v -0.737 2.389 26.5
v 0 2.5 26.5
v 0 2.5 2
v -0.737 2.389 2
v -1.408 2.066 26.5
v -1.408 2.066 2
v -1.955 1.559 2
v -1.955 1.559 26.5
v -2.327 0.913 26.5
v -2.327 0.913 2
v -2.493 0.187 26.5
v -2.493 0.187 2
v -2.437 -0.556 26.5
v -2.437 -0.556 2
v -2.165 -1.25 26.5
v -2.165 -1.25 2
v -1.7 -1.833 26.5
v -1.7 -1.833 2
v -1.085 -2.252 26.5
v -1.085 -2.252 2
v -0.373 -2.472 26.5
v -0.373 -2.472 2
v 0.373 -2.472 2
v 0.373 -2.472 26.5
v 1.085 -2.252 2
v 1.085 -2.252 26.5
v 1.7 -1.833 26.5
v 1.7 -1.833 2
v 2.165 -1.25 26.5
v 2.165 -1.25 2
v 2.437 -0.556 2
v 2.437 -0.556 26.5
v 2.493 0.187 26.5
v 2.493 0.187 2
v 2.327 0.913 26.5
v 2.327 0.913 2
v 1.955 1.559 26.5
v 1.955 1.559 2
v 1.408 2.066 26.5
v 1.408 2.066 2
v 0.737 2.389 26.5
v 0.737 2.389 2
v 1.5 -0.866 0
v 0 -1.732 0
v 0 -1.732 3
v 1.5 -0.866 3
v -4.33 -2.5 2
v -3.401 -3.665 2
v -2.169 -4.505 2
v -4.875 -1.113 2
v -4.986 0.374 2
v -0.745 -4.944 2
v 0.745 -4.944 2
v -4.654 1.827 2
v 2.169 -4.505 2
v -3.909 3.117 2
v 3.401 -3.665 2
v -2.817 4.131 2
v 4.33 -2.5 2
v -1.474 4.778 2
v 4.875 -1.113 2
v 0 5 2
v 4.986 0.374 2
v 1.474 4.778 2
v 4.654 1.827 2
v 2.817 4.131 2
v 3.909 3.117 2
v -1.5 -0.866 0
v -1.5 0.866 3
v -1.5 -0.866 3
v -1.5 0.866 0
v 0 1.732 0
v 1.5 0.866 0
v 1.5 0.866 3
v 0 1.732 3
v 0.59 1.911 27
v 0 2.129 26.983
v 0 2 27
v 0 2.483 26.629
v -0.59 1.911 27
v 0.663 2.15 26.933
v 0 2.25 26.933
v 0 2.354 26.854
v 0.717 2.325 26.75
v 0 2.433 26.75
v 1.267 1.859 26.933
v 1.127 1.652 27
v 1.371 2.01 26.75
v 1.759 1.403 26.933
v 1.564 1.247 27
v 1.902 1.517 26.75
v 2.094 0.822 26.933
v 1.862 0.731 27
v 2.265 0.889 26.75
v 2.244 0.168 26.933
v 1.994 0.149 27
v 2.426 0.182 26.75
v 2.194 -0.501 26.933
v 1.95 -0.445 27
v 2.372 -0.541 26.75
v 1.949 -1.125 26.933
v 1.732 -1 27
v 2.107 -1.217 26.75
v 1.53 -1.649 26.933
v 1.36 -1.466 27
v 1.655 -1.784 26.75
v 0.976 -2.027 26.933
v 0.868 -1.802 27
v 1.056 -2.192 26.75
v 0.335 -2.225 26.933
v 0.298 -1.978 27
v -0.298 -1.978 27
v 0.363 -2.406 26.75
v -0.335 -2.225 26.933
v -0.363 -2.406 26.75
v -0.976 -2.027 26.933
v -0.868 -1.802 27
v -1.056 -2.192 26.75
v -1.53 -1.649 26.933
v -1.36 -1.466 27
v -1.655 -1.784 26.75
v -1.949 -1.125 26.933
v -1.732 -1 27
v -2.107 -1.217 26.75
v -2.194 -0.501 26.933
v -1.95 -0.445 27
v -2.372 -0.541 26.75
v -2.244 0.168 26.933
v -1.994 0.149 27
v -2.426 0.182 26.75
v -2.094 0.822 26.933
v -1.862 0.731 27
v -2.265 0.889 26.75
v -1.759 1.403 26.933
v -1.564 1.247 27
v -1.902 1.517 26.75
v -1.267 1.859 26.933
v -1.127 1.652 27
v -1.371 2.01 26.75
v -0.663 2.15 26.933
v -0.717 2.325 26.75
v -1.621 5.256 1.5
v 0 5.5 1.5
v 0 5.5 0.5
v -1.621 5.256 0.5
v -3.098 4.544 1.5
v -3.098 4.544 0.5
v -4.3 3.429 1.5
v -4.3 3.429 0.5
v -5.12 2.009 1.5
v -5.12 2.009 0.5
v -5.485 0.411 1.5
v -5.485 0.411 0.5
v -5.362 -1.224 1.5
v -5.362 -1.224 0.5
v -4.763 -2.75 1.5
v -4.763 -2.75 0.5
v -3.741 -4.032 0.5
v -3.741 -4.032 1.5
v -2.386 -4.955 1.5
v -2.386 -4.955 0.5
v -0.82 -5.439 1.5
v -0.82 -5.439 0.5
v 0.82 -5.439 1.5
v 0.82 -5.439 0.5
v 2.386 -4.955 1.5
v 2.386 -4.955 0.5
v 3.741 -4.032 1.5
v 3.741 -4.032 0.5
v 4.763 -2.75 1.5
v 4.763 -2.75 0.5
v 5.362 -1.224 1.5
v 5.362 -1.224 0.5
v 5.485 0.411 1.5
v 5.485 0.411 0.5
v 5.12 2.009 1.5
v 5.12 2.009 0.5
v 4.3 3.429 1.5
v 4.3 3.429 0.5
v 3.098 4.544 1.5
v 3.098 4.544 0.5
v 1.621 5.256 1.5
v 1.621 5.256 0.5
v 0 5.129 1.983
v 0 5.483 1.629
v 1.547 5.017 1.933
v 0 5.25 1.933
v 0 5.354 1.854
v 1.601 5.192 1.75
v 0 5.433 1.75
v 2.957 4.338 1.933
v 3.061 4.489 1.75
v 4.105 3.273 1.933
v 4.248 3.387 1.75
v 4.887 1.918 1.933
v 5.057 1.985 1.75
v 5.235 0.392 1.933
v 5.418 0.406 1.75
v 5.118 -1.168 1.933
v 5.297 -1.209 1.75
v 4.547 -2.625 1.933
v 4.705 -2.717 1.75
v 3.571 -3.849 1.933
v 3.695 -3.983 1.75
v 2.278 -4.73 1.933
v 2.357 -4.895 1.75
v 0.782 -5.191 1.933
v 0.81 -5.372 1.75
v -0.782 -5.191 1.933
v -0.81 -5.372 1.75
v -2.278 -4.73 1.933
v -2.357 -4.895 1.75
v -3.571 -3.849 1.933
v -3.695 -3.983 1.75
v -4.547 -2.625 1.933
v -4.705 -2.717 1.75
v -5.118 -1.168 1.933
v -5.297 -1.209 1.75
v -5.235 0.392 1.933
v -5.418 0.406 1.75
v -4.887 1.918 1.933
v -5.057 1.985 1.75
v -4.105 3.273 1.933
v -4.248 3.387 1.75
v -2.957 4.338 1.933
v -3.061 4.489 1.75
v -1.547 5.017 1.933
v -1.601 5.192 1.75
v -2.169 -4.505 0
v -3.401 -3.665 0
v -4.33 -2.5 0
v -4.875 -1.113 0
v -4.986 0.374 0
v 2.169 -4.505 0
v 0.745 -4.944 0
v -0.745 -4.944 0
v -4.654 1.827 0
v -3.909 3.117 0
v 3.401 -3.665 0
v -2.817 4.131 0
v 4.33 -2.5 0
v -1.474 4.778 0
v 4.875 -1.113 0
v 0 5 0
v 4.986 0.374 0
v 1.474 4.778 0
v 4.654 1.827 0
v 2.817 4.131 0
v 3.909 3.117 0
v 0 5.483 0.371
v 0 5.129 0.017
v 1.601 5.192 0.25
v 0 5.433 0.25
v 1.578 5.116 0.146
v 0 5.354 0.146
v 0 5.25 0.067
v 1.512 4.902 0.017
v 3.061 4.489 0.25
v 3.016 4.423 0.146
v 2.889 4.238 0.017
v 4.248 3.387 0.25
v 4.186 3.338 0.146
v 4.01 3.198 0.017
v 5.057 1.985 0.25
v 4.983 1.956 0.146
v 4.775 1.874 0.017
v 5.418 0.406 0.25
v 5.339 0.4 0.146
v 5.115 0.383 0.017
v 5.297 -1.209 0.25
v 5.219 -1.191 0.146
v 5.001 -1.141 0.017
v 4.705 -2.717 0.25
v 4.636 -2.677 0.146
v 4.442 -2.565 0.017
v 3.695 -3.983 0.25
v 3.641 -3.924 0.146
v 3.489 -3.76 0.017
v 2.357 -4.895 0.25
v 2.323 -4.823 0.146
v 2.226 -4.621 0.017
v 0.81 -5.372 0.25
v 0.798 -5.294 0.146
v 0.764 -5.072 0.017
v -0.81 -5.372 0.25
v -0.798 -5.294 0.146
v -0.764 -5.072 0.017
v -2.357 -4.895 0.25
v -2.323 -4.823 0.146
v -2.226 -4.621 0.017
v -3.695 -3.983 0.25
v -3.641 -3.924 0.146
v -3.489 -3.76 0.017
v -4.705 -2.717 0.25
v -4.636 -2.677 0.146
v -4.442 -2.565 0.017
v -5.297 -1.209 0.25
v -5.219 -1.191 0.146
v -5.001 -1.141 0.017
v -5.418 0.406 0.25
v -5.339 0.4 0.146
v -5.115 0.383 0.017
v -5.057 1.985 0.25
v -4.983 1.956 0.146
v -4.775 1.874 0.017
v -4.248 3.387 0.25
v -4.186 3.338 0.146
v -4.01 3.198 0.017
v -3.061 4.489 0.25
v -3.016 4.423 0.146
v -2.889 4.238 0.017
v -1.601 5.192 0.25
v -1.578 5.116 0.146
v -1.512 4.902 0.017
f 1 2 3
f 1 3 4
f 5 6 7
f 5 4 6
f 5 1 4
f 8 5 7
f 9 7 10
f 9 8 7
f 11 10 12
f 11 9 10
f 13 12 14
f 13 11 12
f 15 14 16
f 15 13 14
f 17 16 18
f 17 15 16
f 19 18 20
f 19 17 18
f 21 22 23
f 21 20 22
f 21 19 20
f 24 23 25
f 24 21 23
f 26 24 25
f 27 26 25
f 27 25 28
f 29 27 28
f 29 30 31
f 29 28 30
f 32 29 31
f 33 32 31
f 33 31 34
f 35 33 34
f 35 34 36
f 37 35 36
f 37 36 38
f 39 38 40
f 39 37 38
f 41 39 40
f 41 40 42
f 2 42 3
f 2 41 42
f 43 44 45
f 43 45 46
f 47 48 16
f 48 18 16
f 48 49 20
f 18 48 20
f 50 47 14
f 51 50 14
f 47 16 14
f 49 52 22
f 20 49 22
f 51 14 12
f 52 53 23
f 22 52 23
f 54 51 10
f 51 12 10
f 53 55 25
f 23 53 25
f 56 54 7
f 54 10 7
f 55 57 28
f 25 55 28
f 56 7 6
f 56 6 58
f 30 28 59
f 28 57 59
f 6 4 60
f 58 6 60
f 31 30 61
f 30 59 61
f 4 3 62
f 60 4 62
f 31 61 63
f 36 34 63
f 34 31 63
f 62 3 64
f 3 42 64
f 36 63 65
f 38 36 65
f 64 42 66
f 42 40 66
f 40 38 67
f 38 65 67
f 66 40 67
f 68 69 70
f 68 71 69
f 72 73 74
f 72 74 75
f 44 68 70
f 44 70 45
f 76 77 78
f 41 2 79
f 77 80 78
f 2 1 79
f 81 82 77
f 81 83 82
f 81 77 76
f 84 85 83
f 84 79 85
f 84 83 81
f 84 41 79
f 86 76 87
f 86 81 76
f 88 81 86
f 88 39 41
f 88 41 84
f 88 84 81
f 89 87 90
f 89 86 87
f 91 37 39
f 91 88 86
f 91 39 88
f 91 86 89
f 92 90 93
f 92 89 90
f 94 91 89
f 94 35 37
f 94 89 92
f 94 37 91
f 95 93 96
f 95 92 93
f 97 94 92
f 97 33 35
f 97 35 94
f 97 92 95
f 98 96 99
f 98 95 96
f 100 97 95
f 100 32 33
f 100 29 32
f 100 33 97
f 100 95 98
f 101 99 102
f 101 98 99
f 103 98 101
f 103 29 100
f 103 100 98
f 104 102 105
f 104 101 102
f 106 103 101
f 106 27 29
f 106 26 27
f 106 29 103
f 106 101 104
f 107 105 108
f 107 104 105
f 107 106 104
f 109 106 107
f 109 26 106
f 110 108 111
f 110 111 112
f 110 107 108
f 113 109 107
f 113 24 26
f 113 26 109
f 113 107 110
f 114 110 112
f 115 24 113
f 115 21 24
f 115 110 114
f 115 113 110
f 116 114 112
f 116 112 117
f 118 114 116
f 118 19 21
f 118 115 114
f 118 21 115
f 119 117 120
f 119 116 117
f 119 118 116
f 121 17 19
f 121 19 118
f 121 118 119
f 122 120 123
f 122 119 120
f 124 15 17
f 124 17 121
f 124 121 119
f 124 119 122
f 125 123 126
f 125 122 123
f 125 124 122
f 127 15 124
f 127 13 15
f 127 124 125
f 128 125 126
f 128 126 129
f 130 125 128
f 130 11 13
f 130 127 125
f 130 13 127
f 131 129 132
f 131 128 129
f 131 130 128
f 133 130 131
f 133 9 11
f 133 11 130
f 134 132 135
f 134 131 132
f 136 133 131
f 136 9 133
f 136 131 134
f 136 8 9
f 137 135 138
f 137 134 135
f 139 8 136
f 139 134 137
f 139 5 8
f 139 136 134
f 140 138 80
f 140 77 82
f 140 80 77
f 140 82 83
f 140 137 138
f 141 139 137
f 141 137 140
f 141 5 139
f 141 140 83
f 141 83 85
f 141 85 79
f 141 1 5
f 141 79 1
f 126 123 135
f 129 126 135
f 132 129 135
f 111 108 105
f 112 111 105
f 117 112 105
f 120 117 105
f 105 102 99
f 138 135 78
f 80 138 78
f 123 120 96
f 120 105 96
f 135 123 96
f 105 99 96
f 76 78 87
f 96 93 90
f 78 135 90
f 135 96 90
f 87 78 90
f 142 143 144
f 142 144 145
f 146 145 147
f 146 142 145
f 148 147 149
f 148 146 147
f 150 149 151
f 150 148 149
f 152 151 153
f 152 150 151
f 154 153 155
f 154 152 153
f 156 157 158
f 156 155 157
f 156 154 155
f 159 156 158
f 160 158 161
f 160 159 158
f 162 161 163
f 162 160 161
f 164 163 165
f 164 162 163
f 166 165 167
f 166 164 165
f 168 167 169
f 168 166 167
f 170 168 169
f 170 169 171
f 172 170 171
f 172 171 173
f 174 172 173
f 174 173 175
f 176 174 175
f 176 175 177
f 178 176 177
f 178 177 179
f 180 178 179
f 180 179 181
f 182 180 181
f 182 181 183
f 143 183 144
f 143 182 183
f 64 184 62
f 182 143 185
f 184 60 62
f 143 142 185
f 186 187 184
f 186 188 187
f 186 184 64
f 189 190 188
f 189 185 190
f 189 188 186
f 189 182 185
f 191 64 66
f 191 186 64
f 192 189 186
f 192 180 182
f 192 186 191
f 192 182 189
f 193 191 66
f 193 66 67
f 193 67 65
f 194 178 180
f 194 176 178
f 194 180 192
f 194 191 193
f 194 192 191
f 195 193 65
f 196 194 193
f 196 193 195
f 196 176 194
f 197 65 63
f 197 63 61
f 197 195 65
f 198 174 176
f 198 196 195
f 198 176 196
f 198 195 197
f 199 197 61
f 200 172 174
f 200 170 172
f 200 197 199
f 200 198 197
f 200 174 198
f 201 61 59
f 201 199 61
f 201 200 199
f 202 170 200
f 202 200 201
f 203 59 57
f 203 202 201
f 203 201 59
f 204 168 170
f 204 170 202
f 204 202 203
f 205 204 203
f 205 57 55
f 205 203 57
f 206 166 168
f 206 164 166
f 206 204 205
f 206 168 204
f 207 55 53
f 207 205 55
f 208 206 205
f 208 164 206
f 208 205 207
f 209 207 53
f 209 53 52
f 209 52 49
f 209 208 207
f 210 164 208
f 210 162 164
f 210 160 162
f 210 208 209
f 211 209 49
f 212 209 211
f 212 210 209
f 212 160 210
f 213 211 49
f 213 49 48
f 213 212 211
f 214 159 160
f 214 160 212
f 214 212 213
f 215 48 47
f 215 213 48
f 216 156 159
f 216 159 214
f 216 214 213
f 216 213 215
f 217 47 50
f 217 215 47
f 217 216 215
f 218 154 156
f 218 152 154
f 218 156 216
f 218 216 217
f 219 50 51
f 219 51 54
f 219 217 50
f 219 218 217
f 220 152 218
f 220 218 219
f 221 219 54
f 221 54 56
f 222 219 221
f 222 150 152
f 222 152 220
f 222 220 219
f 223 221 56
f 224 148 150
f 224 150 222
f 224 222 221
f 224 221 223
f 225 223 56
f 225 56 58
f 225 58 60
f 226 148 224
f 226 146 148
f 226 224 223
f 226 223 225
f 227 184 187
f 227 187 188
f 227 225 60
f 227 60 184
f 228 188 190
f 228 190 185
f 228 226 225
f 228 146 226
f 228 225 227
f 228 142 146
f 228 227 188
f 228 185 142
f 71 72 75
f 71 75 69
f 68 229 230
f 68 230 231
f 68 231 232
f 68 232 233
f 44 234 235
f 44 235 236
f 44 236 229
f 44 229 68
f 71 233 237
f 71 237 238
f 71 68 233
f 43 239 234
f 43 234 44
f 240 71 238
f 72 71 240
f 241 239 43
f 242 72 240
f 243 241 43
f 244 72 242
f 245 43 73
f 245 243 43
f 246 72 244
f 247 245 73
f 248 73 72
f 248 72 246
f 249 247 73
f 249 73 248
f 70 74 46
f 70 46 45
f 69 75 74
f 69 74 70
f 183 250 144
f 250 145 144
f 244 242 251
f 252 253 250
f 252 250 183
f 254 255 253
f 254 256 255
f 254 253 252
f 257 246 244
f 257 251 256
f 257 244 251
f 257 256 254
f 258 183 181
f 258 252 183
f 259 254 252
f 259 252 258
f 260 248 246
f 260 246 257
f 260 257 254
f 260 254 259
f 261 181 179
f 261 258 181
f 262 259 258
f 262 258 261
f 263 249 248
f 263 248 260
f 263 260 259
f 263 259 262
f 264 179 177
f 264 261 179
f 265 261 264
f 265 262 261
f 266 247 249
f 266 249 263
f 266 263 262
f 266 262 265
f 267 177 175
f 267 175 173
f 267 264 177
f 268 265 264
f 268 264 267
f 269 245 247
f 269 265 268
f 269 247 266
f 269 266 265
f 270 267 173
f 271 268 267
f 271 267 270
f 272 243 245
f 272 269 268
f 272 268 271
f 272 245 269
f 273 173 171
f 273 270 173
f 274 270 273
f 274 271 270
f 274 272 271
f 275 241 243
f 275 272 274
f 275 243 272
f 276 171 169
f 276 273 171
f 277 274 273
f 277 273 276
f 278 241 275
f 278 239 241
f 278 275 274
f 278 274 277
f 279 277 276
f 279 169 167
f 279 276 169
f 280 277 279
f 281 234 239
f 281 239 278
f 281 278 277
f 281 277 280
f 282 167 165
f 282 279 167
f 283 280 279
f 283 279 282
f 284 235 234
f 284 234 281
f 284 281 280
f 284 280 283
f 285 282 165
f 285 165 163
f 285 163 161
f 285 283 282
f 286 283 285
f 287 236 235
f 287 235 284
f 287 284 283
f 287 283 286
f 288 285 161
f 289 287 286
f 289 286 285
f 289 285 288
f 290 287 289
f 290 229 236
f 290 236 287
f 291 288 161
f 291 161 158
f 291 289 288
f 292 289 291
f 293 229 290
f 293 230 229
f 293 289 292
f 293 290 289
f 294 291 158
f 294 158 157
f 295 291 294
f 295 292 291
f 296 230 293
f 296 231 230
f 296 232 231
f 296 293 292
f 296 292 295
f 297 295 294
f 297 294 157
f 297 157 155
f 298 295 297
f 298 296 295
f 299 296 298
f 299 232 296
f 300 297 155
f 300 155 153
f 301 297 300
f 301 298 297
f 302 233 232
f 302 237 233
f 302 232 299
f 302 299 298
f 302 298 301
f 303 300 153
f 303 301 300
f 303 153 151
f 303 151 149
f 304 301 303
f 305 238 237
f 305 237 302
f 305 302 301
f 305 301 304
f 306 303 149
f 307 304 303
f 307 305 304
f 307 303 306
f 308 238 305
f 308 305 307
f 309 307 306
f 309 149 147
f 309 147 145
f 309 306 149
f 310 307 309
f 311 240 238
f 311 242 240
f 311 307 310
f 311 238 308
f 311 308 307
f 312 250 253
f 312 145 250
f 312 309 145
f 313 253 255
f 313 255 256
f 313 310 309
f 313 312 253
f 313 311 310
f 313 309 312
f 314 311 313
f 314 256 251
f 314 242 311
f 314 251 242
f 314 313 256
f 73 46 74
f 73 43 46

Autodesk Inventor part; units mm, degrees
ref_plane "YZ Plane" through (0, 0, 0) normal (1, 0, 0) x (0, 1, 0)
ref_plane "XZ Plane" through (0, 0, 0) normal (0, 1, 0) x (-1, 0, 0)
ref_plane "XY Plane" through (0, 0, 0) normal (0, 0, 1) x (1, 0, 0)
sketch "Sketch1" plane through (0, 0, 0) normal (1, 0, 0) x (0, 1, 0)
  line L0 (0, 0) -> (5.5, 0)
  line L1 (5.5, 0) -> (5.5, 2)
  line L2 (5.5, 2) -> (2.5, 2)
  line L3 (2.5, 2) -> (2.5, 27)
  line L4 (2.5, 27) -> (0, 27)
  line L5 (0, 27) -> (0, 0)
  dimension "d0" = 25
  dimension "d1" = 2
  dimension "d2" = 5.5
  dimension "d3" = 2.5
revolve "Revolution1" add sketch "Sketch1" angle 360 about axis through (0, 0, 27) along (0, 0, -1)
fillet "Fillet1" radius 0.5 3 edges at (0, -5.5, 0) (0, -5.5, 2) (0, -2.5, 27)
sketch "Sketch2" plane through (0, 0, 0) normal (0, 0, -1) x (-1, 0, 0)
  circle A0 centre (0, 0) radius 5 projected
  line L0 (1.5, -0.866) -> (0, -1.7321)
  line L1 (0, -1.7321) -> (-1.5, -0.866)
  line L2 (-1.5, -0.866) -> (-1.5, 0.866)
  line L3 (-1.5, 0.866) -> (0, 1.7321)
  line L4 (0, 1.7321) -> (1.5, 0.866)
  line L5 (1.5, 0.866) -> (1.5, -0.866)
  dimension "d6" = 3
extrude "Extrusion1" cut sketch "Sketch2" against normal blind 3 contours L0 L1 L2 L3 L4 L5
thread "Thread1" size "M5x0.8" class "6g" standard "ANSI Metric M Profile" length 30 offset 3
properties part number "M5x25 low profile screw"
